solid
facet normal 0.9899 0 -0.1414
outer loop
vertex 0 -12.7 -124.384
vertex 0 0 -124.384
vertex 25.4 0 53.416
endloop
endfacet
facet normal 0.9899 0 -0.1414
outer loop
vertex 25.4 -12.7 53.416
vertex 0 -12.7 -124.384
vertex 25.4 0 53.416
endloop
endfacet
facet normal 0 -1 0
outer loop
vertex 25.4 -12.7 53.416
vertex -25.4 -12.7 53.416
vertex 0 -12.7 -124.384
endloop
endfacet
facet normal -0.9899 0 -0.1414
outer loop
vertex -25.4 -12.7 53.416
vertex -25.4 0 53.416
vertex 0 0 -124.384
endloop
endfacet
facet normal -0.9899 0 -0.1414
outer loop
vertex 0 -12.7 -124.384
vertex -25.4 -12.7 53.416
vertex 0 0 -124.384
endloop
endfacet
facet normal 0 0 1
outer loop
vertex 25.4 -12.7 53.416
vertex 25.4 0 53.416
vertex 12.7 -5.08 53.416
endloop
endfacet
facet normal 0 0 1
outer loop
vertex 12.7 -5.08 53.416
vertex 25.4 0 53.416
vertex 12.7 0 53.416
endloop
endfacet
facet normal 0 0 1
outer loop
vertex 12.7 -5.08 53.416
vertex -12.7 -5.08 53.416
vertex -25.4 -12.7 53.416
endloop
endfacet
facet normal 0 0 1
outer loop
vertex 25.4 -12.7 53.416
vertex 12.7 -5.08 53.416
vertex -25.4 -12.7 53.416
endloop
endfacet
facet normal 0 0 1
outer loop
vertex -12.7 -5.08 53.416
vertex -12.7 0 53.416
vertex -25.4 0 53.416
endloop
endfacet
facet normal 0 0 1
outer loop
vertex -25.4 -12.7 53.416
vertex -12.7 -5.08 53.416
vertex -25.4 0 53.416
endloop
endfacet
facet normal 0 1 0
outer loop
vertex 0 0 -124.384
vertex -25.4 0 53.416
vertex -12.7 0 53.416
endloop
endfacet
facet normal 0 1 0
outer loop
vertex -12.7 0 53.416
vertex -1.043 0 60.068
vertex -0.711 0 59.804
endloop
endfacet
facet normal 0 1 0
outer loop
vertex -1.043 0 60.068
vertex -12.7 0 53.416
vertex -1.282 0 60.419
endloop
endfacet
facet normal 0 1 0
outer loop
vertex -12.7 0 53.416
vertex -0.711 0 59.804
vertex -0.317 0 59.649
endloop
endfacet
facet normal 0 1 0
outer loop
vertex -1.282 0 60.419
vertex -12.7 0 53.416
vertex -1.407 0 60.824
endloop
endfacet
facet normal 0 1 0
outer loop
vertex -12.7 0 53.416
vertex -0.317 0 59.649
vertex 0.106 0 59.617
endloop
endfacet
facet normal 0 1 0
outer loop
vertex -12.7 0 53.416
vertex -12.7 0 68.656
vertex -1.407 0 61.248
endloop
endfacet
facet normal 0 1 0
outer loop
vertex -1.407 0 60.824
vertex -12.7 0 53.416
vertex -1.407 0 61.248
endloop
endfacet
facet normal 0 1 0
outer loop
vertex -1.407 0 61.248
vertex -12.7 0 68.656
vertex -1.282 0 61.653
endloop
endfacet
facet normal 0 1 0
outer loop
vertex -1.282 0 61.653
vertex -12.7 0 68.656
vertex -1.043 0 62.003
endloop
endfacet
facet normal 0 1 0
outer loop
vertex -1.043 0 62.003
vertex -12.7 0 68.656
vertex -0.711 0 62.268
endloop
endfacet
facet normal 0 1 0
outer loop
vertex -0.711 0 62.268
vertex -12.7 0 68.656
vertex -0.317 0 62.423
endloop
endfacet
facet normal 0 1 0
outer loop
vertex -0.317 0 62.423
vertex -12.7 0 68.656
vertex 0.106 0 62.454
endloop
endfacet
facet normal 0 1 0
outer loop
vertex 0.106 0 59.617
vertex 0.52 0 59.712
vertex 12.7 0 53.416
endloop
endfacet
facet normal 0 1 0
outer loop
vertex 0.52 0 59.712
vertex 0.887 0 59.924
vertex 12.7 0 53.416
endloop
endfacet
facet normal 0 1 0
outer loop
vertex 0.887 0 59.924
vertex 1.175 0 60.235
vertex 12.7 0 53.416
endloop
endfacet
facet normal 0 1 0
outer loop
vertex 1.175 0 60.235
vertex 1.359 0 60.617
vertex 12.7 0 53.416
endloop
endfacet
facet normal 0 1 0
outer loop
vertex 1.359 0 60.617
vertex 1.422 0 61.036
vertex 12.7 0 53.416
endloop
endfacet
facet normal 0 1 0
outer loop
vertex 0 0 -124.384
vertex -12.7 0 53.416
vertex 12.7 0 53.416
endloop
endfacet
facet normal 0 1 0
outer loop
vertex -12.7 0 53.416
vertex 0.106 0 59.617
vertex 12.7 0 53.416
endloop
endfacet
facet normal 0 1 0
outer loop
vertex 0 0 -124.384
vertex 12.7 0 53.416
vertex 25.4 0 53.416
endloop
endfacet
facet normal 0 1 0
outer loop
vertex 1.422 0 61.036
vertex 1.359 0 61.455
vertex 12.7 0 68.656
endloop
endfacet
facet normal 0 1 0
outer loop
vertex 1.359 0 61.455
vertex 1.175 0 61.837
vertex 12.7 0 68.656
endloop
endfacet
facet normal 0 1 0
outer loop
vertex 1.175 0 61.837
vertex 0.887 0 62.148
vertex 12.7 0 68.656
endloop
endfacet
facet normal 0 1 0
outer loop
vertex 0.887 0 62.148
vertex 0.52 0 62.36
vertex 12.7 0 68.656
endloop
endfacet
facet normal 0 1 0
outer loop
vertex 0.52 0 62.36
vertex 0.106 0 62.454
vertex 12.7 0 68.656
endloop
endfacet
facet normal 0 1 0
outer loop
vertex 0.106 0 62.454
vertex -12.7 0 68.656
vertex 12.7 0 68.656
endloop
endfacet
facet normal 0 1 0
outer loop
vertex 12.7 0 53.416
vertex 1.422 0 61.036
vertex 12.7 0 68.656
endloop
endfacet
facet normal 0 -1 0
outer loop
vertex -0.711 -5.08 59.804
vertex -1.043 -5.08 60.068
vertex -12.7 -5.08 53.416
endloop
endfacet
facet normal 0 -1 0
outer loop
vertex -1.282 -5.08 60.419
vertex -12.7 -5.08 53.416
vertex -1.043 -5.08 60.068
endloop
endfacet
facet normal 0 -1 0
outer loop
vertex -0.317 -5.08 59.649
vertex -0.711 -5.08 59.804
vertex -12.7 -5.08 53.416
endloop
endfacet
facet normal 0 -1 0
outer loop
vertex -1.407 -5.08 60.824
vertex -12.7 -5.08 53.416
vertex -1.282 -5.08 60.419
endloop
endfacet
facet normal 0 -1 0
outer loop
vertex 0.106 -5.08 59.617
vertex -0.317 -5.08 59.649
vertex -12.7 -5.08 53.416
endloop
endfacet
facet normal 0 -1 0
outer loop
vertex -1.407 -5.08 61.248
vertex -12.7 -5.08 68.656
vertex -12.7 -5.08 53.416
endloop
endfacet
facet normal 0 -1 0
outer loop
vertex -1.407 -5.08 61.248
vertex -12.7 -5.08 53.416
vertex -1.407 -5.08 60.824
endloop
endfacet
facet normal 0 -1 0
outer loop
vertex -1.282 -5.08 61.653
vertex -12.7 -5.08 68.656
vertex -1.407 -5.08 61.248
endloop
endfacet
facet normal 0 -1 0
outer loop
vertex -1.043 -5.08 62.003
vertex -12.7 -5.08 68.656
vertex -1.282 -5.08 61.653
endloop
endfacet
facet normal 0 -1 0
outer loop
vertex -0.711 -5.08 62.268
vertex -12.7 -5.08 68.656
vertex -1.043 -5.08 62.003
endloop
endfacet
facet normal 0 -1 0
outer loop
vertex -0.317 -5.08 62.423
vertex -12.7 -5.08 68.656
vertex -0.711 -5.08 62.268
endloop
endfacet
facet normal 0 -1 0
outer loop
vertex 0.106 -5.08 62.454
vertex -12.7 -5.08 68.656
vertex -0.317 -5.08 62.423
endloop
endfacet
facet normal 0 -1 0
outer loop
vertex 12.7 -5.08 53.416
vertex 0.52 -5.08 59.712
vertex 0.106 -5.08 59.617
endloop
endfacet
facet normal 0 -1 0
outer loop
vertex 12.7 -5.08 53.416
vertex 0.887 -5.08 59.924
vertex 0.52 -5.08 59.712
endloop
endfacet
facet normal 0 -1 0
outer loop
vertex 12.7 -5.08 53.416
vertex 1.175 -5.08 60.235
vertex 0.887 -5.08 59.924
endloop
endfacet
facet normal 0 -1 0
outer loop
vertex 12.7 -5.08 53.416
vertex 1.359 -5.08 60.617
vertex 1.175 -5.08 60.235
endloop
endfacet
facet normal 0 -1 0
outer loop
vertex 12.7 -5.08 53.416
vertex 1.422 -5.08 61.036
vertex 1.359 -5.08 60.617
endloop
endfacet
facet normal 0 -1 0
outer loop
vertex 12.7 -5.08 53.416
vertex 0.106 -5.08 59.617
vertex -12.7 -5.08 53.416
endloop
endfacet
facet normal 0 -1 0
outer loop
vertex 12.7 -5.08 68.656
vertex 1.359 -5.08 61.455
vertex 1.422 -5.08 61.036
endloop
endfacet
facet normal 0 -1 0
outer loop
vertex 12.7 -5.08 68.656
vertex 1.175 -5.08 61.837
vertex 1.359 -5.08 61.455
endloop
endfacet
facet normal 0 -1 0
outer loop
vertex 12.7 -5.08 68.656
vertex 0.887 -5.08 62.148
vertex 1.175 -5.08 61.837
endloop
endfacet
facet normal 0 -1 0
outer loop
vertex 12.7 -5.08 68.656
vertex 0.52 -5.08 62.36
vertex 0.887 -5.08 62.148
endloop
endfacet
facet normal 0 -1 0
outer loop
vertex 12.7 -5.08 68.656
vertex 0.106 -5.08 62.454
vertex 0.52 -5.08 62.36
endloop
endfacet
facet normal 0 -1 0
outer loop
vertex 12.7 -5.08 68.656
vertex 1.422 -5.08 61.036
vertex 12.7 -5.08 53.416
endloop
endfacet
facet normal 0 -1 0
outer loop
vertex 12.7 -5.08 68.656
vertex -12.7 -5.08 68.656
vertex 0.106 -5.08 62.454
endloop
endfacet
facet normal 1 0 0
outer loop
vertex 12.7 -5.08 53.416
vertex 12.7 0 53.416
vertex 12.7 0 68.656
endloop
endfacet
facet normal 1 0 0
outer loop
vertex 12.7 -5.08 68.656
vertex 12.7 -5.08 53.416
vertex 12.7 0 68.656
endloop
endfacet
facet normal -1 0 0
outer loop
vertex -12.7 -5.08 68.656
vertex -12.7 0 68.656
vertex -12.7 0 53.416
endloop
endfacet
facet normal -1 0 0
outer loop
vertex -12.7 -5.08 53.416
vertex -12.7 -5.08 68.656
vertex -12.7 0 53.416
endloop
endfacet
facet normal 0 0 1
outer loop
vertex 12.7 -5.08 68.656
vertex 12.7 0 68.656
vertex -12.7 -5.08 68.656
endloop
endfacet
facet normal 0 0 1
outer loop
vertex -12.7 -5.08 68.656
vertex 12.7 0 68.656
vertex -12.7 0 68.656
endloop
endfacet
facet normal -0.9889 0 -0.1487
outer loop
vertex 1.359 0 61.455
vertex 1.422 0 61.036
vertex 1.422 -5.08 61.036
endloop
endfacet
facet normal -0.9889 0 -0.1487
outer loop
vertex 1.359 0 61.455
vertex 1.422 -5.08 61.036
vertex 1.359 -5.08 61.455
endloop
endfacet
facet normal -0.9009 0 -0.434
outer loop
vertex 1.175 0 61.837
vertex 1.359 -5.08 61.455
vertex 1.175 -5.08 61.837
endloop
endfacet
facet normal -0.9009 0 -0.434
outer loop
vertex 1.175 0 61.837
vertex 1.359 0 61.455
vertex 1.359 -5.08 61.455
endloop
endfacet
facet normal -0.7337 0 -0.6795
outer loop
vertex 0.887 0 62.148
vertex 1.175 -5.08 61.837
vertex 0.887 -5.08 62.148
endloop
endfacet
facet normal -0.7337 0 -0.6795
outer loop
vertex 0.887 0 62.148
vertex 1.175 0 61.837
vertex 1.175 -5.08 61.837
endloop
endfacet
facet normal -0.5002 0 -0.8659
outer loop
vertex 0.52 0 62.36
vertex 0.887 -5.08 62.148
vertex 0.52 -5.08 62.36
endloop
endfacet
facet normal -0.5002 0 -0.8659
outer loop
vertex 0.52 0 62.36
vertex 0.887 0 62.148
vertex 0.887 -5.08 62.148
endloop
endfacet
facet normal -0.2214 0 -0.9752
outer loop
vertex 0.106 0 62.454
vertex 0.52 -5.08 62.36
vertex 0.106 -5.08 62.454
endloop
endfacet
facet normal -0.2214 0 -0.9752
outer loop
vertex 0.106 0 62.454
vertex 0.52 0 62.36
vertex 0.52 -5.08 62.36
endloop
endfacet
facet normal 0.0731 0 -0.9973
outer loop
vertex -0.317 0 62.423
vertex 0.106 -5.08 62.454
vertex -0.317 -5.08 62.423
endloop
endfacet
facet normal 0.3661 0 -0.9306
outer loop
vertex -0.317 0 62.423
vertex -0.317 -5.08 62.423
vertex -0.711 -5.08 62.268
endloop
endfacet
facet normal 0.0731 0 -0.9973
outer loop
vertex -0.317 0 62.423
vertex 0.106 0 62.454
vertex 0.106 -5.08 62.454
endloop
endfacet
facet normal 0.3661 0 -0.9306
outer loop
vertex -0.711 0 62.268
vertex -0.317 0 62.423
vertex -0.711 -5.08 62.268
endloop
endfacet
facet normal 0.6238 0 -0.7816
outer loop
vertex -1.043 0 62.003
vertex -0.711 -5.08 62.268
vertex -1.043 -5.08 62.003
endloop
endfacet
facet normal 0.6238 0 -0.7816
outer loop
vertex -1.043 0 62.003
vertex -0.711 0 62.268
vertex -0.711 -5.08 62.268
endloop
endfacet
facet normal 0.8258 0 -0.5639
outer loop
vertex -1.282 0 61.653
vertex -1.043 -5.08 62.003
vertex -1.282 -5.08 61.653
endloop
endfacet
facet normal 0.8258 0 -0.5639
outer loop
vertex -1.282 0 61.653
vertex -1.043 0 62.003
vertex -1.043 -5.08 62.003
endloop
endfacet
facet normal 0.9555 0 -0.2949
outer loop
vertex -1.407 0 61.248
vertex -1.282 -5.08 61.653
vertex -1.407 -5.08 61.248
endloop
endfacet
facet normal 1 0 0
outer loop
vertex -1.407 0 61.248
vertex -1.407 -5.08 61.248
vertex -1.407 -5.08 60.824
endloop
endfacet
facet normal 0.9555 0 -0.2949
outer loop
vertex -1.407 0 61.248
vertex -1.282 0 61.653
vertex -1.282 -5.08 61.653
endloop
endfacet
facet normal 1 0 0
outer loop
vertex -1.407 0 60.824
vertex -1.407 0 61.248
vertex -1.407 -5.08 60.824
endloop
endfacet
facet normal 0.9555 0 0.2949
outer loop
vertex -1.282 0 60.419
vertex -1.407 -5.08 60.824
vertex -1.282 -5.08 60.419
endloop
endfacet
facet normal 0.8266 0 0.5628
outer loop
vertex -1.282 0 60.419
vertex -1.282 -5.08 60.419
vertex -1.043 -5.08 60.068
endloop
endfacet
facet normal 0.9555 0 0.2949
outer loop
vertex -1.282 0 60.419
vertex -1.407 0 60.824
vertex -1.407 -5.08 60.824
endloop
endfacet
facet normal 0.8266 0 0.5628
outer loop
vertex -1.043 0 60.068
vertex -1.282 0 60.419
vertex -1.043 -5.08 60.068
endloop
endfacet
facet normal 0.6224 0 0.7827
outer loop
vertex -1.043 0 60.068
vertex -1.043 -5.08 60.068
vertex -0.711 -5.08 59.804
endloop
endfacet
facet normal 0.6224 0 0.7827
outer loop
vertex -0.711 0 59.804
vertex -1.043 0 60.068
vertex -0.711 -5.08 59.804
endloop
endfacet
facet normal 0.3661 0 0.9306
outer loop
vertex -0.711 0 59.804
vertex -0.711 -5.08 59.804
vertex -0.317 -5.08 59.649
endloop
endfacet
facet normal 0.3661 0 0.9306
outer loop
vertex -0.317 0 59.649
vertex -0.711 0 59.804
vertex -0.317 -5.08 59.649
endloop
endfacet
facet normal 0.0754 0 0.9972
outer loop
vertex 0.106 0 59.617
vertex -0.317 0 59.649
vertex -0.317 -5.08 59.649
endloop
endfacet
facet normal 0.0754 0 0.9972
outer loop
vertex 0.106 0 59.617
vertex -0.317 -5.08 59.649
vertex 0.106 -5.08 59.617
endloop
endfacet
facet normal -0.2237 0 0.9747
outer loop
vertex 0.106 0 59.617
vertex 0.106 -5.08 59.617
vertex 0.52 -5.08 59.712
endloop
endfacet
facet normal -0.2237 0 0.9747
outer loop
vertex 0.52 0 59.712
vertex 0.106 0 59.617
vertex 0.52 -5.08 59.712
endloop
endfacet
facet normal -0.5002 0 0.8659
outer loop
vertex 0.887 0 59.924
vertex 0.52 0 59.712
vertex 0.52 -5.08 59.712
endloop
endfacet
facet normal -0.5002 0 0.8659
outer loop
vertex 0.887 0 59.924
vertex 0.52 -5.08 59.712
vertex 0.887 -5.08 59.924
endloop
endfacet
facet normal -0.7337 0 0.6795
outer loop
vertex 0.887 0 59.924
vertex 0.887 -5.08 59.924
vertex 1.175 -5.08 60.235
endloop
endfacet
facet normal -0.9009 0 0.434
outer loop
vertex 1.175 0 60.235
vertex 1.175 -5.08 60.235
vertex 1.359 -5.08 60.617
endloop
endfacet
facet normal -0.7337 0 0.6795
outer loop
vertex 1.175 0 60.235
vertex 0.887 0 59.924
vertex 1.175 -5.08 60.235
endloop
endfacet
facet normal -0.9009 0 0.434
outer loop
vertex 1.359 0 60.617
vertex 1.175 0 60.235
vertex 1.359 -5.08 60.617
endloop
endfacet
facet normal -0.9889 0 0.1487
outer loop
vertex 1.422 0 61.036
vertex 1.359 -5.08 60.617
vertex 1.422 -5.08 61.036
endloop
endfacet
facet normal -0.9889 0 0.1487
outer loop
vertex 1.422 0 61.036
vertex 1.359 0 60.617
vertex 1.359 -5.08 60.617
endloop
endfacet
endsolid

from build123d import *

# Parameters (mm, degrees)
F1_DEPTH = 12.7
F0_R     = 1.4224
F2_DEPTH = 5.08


with BuildPart() as f1:
    # F0 (on Front) → F1 (new body)
    with BuildSketch(Plane.XZ):
        Polygon((0, -124.384157), (0, 53.415843), (-12.7, 53.415843), (-25.4, 53.415843), align=None)
        Polygon((12.7, 53.415843), (0, 53.415843), (0, -124.384157), (25.4, 53.415843), align=None)
    extrude(amount=F1_DEPTH)

    # F0 (on Front) → F2 (join)
    with BuildSketch(Plane.XZ):
        Polygon((-12.7, 53.415843), (0, 53.415843), (12.7, 53.415843), (12.7, 68.655843), (-12.7, 68.655843), align=None)
        with Locations((0, 61.035843)):
            Circle(F0_R, mode=Mode.SUBTRACT)
    extrude(amount=F2_DEPTH)


solid = f1.part
